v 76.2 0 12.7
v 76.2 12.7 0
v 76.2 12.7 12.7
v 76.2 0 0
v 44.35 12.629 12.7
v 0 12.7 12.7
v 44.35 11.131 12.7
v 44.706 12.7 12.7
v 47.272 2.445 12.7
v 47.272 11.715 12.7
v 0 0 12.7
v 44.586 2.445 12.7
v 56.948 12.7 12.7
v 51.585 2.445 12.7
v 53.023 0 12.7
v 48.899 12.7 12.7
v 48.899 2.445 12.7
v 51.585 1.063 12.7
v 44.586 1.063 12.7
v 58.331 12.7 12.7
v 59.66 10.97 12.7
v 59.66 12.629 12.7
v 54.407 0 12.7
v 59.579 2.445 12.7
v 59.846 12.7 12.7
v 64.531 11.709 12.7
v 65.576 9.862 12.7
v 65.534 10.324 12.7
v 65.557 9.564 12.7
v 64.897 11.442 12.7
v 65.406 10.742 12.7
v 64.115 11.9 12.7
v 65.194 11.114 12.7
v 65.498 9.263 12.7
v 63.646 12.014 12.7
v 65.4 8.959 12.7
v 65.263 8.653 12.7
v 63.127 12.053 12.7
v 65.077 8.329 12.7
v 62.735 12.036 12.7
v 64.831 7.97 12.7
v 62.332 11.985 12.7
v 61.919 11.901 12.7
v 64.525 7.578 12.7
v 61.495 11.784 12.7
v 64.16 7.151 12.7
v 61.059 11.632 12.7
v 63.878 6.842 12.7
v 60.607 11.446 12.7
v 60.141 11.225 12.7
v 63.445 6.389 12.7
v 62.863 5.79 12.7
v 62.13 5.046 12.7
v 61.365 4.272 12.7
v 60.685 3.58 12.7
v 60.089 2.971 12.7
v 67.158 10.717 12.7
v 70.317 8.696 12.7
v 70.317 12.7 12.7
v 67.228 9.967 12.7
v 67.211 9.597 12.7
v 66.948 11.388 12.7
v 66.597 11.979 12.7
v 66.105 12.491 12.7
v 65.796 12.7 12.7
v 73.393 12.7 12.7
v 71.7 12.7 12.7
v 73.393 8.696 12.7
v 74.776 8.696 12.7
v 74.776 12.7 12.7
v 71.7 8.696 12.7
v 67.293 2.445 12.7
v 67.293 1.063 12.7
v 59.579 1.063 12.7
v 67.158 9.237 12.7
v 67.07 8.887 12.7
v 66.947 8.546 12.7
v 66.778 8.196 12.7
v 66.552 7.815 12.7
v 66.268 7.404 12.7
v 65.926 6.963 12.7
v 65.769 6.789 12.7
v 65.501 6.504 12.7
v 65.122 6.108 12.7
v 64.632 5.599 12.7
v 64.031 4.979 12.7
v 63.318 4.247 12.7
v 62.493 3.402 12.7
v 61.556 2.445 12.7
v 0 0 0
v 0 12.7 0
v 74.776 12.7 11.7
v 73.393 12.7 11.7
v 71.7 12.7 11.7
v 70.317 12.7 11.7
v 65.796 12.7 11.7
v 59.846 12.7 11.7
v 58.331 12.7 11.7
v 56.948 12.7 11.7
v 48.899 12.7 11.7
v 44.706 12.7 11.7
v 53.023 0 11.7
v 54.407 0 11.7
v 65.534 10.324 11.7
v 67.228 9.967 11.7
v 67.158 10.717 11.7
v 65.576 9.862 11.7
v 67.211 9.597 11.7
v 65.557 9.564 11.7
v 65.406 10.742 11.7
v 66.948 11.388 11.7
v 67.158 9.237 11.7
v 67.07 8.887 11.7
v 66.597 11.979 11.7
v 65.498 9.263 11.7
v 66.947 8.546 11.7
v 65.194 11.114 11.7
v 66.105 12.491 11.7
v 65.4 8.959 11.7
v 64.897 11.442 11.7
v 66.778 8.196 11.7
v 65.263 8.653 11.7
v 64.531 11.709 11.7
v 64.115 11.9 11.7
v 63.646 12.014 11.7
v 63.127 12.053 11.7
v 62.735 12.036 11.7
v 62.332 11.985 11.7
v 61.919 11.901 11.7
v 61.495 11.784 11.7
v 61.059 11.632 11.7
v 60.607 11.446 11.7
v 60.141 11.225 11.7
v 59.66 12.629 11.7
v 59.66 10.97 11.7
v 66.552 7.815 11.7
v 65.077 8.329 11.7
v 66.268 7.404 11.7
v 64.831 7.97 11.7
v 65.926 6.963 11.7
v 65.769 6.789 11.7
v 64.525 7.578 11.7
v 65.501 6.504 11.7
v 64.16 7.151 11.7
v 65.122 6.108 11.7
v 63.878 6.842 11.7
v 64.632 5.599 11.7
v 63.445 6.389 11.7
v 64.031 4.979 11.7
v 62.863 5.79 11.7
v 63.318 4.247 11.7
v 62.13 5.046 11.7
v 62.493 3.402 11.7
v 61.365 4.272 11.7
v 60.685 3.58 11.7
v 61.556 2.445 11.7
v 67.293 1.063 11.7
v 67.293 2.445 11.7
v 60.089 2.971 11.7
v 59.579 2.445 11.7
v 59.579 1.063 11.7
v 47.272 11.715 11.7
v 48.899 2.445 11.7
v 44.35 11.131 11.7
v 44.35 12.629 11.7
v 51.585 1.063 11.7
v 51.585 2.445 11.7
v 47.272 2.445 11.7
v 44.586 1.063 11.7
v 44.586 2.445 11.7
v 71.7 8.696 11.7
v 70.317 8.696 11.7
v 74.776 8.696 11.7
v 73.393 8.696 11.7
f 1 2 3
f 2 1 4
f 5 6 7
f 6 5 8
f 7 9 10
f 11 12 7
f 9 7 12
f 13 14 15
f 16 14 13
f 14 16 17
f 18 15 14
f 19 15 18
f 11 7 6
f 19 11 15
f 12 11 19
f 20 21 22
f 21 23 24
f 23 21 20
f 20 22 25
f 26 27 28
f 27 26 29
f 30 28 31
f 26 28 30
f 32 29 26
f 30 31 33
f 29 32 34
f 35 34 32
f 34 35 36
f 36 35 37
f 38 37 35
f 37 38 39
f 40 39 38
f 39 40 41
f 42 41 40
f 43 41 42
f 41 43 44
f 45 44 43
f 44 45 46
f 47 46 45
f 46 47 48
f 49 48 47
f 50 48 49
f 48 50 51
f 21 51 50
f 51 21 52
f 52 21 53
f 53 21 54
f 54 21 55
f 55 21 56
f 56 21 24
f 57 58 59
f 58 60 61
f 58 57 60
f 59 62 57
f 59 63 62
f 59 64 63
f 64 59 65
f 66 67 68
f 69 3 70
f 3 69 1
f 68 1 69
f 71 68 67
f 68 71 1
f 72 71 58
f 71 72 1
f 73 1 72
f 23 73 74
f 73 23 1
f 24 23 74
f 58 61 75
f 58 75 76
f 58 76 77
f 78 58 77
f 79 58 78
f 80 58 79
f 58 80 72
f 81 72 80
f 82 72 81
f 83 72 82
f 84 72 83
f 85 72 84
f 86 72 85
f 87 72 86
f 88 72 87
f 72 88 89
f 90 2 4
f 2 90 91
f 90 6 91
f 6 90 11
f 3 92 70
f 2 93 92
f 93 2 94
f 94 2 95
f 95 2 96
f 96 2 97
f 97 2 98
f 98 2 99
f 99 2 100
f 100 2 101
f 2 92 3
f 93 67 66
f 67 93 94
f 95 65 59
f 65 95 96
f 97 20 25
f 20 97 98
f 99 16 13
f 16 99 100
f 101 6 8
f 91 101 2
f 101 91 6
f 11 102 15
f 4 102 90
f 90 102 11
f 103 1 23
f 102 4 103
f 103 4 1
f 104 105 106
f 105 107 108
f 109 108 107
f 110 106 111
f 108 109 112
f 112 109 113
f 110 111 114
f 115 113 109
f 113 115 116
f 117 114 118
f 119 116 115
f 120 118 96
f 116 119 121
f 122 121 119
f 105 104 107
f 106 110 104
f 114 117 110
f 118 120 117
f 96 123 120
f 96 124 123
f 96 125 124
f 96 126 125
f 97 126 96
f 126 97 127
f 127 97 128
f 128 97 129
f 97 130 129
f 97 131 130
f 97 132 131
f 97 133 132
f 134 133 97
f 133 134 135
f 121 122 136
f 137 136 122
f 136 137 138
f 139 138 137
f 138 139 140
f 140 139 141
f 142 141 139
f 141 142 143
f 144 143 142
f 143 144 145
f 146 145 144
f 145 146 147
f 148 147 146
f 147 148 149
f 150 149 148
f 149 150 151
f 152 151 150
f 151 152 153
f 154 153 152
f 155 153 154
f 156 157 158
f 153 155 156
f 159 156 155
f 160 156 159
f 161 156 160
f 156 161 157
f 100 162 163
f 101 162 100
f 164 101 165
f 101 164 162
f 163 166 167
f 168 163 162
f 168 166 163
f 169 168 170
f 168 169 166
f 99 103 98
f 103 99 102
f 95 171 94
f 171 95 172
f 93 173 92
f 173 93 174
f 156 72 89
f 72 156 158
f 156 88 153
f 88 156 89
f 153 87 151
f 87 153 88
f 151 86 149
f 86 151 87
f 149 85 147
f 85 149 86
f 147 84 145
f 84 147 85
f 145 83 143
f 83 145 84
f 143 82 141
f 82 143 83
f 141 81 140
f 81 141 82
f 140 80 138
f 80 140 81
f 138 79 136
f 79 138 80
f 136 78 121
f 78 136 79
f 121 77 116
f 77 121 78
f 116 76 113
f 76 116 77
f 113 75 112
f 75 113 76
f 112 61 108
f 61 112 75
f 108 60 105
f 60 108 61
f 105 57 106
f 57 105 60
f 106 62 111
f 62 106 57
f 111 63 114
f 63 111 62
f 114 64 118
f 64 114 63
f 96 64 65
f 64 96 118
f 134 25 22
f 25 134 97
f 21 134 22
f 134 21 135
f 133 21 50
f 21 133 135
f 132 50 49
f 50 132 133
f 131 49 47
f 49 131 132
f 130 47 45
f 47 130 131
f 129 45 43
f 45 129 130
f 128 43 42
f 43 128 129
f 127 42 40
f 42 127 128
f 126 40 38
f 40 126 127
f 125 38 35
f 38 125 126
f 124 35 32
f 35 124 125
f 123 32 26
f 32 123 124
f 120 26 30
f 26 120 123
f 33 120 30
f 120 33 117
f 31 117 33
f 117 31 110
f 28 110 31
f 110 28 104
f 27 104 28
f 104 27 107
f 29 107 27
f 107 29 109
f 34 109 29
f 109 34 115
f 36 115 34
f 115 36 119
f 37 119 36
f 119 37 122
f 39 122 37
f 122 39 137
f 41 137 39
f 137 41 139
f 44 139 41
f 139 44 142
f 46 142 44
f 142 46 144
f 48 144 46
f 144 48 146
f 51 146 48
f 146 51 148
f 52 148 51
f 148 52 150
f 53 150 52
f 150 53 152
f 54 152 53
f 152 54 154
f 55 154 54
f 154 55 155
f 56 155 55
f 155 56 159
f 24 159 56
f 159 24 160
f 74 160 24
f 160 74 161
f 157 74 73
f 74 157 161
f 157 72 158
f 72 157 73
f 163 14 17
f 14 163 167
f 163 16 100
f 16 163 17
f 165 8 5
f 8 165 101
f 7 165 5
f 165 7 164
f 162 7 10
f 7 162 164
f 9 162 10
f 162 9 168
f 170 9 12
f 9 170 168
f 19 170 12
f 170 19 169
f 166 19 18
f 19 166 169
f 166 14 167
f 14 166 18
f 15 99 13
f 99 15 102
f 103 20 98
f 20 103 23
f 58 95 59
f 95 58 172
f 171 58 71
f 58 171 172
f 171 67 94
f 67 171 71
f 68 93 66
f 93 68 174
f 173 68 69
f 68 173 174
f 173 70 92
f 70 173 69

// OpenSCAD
mm_in_an_inch = 25.4;

font = "Fira Mono Nerd Font";

width = 3 * mm_in_an_inch;
depth = 0.5 * mm_in_an_inch;
height = 0.5 * mm_in_an_inch;

module label(l) {
	// Use linear_extrude() to make the letters 3D objects as they
	// are only 2D shapes when only using text()
	linear_extrude(height = 2) {
		text(
            l, 
            size = 12, 
            font = font, 
            halign = "right", 
            valign = "center");
	}
}

difference() {
    cube([width, depth, height]);
    translate([width, depth / 2, height - 1]) label("1/2\"");
}
